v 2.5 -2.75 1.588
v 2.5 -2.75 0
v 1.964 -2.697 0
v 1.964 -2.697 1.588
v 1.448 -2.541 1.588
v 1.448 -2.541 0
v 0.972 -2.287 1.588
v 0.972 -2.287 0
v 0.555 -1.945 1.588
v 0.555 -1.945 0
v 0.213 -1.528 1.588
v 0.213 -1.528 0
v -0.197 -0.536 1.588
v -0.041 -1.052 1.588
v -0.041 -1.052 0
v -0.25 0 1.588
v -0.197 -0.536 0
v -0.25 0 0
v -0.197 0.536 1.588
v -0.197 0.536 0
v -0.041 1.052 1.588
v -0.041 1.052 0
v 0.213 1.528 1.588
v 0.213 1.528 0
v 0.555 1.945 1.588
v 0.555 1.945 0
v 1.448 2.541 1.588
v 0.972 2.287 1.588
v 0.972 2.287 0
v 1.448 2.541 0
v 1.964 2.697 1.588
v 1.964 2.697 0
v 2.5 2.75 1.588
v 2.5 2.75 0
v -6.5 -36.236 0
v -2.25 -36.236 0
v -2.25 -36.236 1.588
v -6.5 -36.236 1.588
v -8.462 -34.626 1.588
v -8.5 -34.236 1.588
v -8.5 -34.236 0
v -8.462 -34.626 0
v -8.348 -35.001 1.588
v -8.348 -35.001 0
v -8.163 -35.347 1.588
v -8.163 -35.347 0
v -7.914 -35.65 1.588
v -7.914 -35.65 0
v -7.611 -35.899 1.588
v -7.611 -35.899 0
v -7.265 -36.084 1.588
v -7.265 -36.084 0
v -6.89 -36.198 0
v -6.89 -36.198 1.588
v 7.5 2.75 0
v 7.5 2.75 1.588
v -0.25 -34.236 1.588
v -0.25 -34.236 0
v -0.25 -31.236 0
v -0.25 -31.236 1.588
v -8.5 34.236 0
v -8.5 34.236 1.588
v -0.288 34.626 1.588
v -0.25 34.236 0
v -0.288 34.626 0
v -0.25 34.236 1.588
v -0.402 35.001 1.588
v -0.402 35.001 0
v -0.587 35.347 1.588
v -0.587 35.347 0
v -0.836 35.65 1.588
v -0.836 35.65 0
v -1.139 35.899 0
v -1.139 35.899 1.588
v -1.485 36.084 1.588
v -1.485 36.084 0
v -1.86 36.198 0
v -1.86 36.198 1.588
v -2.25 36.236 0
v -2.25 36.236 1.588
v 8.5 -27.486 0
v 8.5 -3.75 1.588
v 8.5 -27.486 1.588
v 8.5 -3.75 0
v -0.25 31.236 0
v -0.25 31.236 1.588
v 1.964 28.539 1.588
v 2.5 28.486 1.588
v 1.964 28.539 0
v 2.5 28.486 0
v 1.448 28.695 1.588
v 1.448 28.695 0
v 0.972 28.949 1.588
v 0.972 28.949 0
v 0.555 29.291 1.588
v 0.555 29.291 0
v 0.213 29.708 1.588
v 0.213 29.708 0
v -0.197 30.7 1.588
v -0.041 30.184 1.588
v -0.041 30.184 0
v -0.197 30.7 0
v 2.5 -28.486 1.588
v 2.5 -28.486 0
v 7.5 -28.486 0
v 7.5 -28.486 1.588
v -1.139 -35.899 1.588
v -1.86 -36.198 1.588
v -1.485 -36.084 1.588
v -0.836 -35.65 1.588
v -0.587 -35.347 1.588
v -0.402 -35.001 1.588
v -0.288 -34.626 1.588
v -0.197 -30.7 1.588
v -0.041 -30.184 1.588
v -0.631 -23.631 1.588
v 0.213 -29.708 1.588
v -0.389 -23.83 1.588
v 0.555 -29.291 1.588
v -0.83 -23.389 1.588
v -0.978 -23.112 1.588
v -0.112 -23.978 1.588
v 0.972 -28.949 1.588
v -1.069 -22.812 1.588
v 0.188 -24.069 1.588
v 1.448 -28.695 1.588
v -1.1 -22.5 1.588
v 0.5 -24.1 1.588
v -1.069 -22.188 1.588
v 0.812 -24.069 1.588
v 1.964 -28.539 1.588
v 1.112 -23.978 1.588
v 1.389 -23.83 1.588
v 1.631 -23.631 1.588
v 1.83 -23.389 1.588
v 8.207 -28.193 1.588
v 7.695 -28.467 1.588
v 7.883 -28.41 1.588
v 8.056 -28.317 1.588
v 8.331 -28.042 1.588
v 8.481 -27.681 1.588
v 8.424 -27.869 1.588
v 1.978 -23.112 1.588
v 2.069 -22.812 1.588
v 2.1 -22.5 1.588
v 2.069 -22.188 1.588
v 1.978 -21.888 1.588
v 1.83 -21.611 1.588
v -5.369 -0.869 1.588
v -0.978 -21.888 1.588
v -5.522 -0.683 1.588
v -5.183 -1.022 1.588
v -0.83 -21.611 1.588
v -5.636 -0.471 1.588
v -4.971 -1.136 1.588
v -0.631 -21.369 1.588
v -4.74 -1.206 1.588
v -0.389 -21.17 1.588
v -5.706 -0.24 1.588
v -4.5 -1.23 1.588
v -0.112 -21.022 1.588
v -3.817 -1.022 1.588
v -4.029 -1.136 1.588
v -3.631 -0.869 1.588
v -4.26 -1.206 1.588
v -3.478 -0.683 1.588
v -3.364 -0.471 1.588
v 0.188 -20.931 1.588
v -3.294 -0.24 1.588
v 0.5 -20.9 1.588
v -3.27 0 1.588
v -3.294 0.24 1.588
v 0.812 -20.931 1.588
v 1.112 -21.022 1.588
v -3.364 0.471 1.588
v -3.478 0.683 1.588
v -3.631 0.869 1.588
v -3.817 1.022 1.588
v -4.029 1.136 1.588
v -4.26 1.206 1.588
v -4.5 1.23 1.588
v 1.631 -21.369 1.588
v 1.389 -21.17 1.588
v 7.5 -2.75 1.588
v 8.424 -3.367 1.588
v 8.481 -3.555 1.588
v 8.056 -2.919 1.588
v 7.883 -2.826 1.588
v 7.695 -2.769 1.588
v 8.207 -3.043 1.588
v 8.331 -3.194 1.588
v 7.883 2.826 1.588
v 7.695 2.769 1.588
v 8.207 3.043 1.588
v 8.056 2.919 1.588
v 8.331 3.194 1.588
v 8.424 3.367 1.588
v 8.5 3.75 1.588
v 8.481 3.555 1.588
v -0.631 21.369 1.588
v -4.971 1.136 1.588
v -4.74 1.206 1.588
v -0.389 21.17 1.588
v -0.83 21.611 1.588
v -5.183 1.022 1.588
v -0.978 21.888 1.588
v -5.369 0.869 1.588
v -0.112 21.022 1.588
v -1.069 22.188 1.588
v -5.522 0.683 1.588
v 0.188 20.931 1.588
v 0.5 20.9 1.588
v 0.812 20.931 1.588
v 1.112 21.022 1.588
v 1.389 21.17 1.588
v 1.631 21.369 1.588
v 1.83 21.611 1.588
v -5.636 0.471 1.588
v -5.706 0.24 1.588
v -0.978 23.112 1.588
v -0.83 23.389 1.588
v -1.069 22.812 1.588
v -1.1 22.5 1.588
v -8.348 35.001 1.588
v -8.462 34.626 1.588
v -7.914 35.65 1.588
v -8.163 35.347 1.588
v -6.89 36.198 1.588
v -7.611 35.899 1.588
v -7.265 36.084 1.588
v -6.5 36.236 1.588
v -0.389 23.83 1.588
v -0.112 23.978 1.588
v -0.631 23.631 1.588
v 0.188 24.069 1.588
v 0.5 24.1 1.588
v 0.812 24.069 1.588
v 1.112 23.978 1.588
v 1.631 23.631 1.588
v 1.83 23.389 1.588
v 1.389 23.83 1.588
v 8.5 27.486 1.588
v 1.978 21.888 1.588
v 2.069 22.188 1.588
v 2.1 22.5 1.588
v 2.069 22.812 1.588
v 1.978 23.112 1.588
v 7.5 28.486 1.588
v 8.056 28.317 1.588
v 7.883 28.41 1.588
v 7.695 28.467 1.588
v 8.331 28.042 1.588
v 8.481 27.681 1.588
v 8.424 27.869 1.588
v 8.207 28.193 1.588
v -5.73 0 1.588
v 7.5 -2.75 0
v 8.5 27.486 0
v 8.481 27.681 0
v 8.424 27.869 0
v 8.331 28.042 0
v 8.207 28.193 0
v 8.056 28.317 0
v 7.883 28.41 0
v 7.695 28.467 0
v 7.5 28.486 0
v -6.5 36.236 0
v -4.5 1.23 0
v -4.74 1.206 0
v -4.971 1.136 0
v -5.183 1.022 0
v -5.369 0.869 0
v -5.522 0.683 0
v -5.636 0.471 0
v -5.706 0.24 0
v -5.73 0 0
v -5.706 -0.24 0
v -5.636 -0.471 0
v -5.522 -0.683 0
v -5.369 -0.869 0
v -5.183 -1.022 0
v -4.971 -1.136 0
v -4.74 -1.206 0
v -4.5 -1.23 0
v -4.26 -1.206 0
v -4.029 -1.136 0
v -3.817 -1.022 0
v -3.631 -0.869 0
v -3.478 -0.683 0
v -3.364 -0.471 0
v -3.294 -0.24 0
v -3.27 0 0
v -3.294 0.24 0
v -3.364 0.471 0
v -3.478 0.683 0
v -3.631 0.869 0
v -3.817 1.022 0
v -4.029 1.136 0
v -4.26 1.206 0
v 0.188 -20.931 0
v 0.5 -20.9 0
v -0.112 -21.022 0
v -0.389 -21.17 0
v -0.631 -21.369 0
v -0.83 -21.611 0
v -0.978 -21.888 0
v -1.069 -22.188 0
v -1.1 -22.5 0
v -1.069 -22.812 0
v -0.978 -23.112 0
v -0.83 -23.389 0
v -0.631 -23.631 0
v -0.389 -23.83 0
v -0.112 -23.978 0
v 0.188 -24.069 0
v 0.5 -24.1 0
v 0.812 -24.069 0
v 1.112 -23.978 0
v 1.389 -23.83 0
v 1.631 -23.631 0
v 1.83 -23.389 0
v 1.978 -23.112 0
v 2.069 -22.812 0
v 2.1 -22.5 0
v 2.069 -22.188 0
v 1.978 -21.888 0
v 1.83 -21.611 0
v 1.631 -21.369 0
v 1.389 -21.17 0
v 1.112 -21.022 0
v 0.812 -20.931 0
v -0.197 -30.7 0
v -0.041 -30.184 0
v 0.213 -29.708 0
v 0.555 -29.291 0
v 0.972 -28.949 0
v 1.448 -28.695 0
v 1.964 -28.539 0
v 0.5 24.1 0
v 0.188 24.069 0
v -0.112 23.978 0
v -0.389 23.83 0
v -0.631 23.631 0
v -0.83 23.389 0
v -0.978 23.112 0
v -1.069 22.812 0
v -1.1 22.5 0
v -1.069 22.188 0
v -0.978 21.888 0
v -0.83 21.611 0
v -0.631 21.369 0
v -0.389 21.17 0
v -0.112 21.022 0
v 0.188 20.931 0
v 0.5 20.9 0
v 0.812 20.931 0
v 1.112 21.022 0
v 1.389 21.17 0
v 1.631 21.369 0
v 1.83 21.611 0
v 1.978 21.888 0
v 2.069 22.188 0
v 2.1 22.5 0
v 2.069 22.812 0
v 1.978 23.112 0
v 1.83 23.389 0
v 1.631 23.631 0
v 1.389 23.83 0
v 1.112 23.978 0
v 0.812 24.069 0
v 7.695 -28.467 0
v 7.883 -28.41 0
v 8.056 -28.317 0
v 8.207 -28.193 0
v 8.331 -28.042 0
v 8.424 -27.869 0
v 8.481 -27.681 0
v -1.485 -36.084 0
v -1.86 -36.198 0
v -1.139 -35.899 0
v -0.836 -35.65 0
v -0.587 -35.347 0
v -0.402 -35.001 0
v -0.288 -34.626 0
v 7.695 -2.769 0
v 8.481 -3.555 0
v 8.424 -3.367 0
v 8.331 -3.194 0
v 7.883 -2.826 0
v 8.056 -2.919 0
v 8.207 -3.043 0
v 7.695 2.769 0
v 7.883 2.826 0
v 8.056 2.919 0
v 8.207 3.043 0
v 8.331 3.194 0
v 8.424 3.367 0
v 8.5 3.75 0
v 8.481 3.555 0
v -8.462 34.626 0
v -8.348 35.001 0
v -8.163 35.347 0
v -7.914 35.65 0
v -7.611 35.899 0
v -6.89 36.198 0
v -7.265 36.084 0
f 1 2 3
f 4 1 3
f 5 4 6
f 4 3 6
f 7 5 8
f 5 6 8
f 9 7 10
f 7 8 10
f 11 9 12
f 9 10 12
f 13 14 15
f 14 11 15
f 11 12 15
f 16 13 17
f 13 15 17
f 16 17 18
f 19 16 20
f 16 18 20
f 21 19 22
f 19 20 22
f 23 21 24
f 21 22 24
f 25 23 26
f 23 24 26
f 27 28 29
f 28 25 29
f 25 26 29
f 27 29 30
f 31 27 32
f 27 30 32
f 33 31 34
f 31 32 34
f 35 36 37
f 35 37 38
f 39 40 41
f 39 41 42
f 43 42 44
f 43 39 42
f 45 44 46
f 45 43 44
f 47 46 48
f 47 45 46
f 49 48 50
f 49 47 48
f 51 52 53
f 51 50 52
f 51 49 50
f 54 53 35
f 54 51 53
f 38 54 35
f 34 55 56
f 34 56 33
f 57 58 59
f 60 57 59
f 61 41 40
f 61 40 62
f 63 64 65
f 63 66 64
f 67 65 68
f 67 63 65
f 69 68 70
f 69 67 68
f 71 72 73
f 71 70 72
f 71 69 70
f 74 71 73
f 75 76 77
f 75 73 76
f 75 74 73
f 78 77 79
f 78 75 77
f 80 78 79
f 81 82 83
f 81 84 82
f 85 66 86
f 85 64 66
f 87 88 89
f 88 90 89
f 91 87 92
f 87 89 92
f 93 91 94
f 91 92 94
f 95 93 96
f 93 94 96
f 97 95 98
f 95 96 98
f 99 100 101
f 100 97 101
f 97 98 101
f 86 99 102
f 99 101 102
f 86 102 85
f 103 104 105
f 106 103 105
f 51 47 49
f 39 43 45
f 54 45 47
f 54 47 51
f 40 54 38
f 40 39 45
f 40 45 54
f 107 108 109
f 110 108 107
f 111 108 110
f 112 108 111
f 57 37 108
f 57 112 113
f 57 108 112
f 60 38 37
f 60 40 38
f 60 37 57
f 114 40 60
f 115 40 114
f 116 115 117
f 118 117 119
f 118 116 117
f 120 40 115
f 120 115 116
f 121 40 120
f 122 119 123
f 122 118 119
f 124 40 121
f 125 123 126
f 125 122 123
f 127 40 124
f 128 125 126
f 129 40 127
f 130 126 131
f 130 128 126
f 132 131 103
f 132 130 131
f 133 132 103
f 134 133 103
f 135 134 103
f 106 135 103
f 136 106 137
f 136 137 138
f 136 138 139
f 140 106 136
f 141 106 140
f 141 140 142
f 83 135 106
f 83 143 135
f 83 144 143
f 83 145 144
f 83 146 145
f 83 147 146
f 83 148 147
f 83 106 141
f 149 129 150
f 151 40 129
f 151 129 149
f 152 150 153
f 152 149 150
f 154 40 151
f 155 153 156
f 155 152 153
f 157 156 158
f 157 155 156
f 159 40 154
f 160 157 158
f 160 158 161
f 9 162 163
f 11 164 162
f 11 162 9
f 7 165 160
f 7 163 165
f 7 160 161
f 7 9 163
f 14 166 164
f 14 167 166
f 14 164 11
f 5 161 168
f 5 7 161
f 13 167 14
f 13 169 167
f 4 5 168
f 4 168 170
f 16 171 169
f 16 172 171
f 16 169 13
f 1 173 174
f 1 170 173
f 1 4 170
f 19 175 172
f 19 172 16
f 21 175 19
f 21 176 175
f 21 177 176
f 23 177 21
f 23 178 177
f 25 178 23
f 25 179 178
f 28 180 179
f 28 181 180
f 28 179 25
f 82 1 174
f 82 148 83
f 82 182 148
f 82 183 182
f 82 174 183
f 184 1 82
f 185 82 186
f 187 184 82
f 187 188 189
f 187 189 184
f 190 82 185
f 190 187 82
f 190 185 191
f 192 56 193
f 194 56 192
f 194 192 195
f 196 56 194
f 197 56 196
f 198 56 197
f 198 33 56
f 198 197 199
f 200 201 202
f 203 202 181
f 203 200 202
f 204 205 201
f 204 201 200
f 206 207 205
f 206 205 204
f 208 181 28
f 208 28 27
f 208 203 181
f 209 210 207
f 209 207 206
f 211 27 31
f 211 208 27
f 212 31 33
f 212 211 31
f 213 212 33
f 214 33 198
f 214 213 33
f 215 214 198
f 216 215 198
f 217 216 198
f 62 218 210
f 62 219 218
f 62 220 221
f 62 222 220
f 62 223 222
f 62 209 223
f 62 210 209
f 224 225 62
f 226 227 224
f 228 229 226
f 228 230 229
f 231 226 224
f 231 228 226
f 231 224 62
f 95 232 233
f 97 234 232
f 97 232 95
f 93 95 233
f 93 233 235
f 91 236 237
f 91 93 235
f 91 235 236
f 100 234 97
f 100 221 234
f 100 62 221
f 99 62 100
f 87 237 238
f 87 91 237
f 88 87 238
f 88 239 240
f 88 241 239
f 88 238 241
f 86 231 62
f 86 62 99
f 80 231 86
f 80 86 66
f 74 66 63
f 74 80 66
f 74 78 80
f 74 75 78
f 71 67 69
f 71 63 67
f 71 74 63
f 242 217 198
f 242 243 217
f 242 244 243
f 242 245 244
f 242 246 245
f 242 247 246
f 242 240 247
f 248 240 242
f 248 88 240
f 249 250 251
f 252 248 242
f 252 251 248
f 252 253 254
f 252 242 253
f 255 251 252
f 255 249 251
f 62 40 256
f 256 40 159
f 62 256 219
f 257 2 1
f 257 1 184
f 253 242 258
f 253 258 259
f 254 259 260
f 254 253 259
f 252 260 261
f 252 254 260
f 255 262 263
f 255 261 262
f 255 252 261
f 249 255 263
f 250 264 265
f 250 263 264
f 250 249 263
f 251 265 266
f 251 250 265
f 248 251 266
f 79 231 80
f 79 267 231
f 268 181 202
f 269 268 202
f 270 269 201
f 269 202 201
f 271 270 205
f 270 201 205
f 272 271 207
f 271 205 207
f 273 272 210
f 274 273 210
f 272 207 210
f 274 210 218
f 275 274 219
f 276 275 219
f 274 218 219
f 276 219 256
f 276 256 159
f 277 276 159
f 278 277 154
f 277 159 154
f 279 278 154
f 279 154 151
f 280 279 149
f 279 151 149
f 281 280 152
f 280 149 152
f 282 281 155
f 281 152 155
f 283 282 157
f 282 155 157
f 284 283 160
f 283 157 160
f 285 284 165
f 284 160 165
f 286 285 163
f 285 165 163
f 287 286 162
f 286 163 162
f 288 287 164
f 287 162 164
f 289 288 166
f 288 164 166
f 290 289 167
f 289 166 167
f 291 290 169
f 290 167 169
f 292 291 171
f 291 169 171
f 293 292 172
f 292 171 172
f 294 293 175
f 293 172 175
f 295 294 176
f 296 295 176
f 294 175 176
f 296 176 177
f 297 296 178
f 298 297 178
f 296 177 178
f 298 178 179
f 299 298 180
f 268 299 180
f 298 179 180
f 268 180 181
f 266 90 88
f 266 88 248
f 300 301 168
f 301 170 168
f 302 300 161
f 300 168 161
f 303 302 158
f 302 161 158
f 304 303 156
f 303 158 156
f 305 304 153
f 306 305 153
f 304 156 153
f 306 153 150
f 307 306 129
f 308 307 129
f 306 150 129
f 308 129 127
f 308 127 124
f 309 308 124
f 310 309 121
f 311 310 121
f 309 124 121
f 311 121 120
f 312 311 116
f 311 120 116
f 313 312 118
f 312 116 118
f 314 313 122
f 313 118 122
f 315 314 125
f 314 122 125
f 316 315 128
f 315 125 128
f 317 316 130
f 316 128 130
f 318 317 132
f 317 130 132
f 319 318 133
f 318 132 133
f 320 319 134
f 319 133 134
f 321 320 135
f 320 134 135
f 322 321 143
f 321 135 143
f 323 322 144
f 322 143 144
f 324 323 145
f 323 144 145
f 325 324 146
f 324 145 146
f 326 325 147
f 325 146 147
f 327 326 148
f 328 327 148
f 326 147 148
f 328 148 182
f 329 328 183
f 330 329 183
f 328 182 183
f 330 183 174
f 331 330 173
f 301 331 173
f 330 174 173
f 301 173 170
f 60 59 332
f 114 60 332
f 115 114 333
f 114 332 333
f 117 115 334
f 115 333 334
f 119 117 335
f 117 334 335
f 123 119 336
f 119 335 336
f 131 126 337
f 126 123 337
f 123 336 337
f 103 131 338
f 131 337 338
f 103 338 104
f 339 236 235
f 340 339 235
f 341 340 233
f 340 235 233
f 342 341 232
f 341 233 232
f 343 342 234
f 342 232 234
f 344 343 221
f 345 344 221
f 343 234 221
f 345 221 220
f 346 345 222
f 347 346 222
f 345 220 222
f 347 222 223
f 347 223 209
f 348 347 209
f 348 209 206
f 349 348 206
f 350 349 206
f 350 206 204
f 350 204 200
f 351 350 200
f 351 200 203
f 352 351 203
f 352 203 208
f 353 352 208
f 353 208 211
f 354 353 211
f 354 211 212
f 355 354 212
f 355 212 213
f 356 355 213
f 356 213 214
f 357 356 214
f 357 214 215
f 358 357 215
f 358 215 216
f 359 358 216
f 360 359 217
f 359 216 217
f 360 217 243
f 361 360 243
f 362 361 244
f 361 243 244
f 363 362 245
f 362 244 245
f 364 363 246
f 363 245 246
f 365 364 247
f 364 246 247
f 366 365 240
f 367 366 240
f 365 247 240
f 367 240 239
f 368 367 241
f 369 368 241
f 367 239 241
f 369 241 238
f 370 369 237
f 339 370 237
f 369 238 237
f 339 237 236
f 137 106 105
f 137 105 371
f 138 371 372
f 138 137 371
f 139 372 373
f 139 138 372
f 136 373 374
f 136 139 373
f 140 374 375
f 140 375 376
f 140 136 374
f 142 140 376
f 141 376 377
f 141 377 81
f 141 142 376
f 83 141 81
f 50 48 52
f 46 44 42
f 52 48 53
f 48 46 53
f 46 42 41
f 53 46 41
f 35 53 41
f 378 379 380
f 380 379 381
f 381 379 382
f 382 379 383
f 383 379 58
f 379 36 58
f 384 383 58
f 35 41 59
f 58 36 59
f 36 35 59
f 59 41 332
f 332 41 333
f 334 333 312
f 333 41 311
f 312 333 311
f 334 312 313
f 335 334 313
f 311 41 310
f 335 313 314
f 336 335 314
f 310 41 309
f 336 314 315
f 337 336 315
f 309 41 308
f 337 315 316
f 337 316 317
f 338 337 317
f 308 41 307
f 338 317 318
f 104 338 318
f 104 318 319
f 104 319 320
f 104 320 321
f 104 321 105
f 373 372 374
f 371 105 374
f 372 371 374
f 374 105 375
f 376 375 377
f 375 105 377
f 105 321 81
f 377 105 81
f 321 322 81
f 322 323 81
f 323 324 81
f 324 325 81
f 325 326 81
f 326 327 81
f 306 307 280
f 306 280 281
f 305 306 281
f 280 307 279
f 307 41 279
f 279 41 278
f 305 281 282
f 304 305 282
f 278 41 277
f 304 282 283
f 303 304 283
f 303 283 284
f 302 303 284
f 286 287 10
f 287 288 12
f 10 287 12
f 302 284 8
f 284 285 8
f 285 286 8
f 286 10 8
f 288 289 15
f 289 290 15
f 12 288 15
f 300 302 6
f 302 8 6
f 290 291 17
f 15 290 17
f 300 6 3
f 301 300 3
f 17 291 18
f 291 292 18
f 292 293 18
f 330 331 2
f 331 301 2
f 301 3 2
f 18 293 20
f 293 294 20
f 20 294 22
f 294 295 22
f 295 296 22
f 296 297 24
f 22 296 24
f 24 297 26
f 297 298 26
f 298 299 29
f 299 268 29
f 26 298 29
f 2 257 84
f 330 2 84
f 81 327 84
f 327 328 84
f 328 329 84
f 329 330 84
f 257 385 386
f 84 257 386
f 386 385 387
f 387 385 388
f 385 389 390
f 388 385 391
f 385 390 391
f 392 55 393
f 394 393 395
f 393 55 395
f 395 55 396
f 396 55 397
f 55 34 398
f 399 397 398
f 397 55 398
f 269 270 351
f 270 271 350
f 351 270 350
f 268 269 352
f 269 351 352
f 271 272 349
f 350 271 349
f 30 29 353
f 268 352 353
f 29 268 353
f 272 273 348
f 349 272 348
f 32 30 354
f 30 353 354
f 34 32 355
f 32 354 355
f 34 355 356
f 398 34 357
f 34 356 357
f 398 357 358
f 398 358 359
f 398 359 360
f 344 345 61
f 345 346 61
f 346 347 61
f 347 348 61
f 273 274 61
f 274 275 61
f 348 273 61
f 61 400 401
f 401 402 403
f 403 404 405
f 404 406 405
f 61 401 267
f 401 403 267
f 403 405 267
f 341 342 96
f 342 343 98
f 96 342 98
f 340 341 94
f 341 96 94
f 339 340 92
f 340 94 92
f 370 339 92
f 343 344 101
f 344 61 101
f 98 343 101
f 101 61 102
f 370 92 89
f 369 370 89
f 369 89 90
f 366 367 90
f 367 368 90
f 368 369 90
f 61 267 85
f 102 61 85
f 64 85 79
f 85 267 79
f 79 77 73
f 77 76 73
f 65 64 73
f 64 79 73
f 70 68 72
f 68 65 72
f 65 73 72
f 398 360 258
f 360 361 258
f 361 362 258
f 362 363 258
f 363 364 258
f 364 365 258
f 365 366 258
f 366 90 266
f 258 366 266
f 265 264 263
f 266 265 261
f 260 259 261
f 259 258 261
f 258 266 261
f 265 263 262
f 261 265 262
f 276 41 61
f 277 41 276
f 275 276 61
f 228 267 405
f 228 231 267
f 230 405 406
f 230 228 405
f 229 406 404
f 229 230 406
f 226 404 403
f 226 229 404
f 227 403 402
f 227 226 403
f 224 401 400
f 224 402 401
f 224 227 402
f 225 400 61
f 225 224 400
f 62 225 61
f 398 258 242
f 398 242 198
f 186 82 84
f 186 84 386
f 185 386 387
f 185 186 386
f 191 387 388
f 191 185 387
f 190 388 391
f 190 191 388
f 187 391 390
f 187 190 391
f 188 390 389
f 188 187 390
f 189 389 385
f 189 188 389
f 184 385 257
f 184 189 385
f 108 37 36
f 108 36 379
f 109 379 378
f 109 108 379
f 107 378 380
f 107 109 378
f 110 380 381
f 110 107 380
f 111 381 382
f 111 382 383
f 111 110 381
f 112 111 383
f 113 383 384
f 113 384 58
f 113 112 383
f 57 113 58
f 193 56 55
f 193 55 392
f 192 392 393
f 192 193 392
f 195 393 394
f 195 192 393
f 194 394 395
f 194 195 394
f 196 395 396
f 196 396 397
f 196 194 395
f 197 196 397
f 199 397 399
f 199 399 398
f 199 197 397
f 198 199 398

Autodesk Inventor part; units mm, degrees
ref_plane "YZ Plane" through (0, 0, 0) normal (1, 0, 0) x (0, 1, 0)
ref_plane "XZ Plane" through (0, 0, 0) normal (0, 1, 0) x (-1, 0, 0)
ref_plane "XY Plane" through (0, 0, 0) normal (0, 0, 1) x (1, 0, 0)
sketch "Sketch1" plane through (0, 0, 0) normal (0, 0, 1) x (1, 0, 0)
  line L0 (8.5, -36.236) -> (-8.5, -36.236)
  line L1 (-8.5, -36.236) -> (-8.5, 36.236)
  line L2 (-8.5, 36.236) -> (8.5, 36.236)
  line L3 (8.5, 36.236) -> (8.5, -36.236)
  line L4 (8.5, -36.236) -> (-8.5, 36.236) construction
  line L5 (-8.5, -36.236) -> (8.5, 36.236) construction
  line L6 (8.5, 0) -> (2.5, 0) construction
  line L7 (8.5, 2.75) -> (2.5, 2.75)
  line L8 (2.5, -2.75) -> (8.5, -2.75)
  arc A0 (8.5, -2.75) -> (8.5, 2.75) centre (8.5, 0) ccw
  arc A1 (2.5, 2.75) -> (2.5, -2.75) centre (2.5, 0) ccw
  line L9 (8.5, 36.236) -> (-0.25, 36.236)
  line L10 (-0.25, 36.236) -> (-0.25, 31.236)
  line L11 (2.5, 28.486) -> (8.5, 28.486)
  line L12 (8.5, 28.486) -> (8.5, 36.236)
  line L13 (8.5, -36.236) -> (-0.25, -36.236)
  line L14 (-0.25, -36.236) -> (-0.25, -31.236)
  line L15 (2.5, -28.486) -> (8.5, -28.486)
  line L16 (8.5, -28.486) -> (8.5, -36.236)
  arc A2 (2.5, -28.486) -> (-0.25, -31.236) centre (2.5, -31.236) ccw
  arc A3 (-0.25, 31.236) -> (2.5, 28.486) centre (2.5, 31.236) ccw
  line L17 (0.5, 22.5) -> (0.5, -22.5) construction
  point P0 (0, 0)
  point P1 (5.5, 0)
  point P2 (0.5, 0)
  point P3 (-8.5, 0)
  point P4 (8.5, -28.486)
  point P5 (8.5, 28.486)
  point P6 (-4.5, 0)
  dimension "d0" = 17
  dimension "d1" = 72.472
  dimension "d3" = 5.5
  dimension "d4" = 11
  dimension "d6" = 5
  dimension "d7" = 5
  dimension "d8" = 45
  dimension "d9" = 9
  dimension "d22" = 4
extrude "Extrusion1" add sketch "Sketch1" along normal blind 1.5875 contours L0 L1 L2 L10 A3 L11 L3 L7 A1 L8 L15 A2 L14
fillet "Fillet1" radius 2 2 edges at (-8.5, -36.236, 0.7937) (-8.5, 36.236, 0.7937)
fillet "Fillet2" radius 2 2 edges at (-0.25, -36.236, 0.7937) (-0.25, 36.236, 0.7937)
fillet "Fillet3" radius 1 4 edges at (8.5, -28.486, 0.7937) (8.5, -2.75, 0.7937) (8.5, 2.75, 0.7937) (8.5, 28.486, 0.7937)
hole "Hole1" at (0.5, 22.5, 0) at (0.5, -22.5, 0) direction (0, 0, 1) diameter 3.2 end through all
hole "Hole2" at (-4.5, 0, 0) direction (0, 0, 1) diameter 2.459 end through all thread size "M3x0.5" class "6H" standard "ANSI Metric M Profile"
equation "\"d7\" = d6"
properties part number "Gantry Belt Retainer" material "Aluminum 6061"
